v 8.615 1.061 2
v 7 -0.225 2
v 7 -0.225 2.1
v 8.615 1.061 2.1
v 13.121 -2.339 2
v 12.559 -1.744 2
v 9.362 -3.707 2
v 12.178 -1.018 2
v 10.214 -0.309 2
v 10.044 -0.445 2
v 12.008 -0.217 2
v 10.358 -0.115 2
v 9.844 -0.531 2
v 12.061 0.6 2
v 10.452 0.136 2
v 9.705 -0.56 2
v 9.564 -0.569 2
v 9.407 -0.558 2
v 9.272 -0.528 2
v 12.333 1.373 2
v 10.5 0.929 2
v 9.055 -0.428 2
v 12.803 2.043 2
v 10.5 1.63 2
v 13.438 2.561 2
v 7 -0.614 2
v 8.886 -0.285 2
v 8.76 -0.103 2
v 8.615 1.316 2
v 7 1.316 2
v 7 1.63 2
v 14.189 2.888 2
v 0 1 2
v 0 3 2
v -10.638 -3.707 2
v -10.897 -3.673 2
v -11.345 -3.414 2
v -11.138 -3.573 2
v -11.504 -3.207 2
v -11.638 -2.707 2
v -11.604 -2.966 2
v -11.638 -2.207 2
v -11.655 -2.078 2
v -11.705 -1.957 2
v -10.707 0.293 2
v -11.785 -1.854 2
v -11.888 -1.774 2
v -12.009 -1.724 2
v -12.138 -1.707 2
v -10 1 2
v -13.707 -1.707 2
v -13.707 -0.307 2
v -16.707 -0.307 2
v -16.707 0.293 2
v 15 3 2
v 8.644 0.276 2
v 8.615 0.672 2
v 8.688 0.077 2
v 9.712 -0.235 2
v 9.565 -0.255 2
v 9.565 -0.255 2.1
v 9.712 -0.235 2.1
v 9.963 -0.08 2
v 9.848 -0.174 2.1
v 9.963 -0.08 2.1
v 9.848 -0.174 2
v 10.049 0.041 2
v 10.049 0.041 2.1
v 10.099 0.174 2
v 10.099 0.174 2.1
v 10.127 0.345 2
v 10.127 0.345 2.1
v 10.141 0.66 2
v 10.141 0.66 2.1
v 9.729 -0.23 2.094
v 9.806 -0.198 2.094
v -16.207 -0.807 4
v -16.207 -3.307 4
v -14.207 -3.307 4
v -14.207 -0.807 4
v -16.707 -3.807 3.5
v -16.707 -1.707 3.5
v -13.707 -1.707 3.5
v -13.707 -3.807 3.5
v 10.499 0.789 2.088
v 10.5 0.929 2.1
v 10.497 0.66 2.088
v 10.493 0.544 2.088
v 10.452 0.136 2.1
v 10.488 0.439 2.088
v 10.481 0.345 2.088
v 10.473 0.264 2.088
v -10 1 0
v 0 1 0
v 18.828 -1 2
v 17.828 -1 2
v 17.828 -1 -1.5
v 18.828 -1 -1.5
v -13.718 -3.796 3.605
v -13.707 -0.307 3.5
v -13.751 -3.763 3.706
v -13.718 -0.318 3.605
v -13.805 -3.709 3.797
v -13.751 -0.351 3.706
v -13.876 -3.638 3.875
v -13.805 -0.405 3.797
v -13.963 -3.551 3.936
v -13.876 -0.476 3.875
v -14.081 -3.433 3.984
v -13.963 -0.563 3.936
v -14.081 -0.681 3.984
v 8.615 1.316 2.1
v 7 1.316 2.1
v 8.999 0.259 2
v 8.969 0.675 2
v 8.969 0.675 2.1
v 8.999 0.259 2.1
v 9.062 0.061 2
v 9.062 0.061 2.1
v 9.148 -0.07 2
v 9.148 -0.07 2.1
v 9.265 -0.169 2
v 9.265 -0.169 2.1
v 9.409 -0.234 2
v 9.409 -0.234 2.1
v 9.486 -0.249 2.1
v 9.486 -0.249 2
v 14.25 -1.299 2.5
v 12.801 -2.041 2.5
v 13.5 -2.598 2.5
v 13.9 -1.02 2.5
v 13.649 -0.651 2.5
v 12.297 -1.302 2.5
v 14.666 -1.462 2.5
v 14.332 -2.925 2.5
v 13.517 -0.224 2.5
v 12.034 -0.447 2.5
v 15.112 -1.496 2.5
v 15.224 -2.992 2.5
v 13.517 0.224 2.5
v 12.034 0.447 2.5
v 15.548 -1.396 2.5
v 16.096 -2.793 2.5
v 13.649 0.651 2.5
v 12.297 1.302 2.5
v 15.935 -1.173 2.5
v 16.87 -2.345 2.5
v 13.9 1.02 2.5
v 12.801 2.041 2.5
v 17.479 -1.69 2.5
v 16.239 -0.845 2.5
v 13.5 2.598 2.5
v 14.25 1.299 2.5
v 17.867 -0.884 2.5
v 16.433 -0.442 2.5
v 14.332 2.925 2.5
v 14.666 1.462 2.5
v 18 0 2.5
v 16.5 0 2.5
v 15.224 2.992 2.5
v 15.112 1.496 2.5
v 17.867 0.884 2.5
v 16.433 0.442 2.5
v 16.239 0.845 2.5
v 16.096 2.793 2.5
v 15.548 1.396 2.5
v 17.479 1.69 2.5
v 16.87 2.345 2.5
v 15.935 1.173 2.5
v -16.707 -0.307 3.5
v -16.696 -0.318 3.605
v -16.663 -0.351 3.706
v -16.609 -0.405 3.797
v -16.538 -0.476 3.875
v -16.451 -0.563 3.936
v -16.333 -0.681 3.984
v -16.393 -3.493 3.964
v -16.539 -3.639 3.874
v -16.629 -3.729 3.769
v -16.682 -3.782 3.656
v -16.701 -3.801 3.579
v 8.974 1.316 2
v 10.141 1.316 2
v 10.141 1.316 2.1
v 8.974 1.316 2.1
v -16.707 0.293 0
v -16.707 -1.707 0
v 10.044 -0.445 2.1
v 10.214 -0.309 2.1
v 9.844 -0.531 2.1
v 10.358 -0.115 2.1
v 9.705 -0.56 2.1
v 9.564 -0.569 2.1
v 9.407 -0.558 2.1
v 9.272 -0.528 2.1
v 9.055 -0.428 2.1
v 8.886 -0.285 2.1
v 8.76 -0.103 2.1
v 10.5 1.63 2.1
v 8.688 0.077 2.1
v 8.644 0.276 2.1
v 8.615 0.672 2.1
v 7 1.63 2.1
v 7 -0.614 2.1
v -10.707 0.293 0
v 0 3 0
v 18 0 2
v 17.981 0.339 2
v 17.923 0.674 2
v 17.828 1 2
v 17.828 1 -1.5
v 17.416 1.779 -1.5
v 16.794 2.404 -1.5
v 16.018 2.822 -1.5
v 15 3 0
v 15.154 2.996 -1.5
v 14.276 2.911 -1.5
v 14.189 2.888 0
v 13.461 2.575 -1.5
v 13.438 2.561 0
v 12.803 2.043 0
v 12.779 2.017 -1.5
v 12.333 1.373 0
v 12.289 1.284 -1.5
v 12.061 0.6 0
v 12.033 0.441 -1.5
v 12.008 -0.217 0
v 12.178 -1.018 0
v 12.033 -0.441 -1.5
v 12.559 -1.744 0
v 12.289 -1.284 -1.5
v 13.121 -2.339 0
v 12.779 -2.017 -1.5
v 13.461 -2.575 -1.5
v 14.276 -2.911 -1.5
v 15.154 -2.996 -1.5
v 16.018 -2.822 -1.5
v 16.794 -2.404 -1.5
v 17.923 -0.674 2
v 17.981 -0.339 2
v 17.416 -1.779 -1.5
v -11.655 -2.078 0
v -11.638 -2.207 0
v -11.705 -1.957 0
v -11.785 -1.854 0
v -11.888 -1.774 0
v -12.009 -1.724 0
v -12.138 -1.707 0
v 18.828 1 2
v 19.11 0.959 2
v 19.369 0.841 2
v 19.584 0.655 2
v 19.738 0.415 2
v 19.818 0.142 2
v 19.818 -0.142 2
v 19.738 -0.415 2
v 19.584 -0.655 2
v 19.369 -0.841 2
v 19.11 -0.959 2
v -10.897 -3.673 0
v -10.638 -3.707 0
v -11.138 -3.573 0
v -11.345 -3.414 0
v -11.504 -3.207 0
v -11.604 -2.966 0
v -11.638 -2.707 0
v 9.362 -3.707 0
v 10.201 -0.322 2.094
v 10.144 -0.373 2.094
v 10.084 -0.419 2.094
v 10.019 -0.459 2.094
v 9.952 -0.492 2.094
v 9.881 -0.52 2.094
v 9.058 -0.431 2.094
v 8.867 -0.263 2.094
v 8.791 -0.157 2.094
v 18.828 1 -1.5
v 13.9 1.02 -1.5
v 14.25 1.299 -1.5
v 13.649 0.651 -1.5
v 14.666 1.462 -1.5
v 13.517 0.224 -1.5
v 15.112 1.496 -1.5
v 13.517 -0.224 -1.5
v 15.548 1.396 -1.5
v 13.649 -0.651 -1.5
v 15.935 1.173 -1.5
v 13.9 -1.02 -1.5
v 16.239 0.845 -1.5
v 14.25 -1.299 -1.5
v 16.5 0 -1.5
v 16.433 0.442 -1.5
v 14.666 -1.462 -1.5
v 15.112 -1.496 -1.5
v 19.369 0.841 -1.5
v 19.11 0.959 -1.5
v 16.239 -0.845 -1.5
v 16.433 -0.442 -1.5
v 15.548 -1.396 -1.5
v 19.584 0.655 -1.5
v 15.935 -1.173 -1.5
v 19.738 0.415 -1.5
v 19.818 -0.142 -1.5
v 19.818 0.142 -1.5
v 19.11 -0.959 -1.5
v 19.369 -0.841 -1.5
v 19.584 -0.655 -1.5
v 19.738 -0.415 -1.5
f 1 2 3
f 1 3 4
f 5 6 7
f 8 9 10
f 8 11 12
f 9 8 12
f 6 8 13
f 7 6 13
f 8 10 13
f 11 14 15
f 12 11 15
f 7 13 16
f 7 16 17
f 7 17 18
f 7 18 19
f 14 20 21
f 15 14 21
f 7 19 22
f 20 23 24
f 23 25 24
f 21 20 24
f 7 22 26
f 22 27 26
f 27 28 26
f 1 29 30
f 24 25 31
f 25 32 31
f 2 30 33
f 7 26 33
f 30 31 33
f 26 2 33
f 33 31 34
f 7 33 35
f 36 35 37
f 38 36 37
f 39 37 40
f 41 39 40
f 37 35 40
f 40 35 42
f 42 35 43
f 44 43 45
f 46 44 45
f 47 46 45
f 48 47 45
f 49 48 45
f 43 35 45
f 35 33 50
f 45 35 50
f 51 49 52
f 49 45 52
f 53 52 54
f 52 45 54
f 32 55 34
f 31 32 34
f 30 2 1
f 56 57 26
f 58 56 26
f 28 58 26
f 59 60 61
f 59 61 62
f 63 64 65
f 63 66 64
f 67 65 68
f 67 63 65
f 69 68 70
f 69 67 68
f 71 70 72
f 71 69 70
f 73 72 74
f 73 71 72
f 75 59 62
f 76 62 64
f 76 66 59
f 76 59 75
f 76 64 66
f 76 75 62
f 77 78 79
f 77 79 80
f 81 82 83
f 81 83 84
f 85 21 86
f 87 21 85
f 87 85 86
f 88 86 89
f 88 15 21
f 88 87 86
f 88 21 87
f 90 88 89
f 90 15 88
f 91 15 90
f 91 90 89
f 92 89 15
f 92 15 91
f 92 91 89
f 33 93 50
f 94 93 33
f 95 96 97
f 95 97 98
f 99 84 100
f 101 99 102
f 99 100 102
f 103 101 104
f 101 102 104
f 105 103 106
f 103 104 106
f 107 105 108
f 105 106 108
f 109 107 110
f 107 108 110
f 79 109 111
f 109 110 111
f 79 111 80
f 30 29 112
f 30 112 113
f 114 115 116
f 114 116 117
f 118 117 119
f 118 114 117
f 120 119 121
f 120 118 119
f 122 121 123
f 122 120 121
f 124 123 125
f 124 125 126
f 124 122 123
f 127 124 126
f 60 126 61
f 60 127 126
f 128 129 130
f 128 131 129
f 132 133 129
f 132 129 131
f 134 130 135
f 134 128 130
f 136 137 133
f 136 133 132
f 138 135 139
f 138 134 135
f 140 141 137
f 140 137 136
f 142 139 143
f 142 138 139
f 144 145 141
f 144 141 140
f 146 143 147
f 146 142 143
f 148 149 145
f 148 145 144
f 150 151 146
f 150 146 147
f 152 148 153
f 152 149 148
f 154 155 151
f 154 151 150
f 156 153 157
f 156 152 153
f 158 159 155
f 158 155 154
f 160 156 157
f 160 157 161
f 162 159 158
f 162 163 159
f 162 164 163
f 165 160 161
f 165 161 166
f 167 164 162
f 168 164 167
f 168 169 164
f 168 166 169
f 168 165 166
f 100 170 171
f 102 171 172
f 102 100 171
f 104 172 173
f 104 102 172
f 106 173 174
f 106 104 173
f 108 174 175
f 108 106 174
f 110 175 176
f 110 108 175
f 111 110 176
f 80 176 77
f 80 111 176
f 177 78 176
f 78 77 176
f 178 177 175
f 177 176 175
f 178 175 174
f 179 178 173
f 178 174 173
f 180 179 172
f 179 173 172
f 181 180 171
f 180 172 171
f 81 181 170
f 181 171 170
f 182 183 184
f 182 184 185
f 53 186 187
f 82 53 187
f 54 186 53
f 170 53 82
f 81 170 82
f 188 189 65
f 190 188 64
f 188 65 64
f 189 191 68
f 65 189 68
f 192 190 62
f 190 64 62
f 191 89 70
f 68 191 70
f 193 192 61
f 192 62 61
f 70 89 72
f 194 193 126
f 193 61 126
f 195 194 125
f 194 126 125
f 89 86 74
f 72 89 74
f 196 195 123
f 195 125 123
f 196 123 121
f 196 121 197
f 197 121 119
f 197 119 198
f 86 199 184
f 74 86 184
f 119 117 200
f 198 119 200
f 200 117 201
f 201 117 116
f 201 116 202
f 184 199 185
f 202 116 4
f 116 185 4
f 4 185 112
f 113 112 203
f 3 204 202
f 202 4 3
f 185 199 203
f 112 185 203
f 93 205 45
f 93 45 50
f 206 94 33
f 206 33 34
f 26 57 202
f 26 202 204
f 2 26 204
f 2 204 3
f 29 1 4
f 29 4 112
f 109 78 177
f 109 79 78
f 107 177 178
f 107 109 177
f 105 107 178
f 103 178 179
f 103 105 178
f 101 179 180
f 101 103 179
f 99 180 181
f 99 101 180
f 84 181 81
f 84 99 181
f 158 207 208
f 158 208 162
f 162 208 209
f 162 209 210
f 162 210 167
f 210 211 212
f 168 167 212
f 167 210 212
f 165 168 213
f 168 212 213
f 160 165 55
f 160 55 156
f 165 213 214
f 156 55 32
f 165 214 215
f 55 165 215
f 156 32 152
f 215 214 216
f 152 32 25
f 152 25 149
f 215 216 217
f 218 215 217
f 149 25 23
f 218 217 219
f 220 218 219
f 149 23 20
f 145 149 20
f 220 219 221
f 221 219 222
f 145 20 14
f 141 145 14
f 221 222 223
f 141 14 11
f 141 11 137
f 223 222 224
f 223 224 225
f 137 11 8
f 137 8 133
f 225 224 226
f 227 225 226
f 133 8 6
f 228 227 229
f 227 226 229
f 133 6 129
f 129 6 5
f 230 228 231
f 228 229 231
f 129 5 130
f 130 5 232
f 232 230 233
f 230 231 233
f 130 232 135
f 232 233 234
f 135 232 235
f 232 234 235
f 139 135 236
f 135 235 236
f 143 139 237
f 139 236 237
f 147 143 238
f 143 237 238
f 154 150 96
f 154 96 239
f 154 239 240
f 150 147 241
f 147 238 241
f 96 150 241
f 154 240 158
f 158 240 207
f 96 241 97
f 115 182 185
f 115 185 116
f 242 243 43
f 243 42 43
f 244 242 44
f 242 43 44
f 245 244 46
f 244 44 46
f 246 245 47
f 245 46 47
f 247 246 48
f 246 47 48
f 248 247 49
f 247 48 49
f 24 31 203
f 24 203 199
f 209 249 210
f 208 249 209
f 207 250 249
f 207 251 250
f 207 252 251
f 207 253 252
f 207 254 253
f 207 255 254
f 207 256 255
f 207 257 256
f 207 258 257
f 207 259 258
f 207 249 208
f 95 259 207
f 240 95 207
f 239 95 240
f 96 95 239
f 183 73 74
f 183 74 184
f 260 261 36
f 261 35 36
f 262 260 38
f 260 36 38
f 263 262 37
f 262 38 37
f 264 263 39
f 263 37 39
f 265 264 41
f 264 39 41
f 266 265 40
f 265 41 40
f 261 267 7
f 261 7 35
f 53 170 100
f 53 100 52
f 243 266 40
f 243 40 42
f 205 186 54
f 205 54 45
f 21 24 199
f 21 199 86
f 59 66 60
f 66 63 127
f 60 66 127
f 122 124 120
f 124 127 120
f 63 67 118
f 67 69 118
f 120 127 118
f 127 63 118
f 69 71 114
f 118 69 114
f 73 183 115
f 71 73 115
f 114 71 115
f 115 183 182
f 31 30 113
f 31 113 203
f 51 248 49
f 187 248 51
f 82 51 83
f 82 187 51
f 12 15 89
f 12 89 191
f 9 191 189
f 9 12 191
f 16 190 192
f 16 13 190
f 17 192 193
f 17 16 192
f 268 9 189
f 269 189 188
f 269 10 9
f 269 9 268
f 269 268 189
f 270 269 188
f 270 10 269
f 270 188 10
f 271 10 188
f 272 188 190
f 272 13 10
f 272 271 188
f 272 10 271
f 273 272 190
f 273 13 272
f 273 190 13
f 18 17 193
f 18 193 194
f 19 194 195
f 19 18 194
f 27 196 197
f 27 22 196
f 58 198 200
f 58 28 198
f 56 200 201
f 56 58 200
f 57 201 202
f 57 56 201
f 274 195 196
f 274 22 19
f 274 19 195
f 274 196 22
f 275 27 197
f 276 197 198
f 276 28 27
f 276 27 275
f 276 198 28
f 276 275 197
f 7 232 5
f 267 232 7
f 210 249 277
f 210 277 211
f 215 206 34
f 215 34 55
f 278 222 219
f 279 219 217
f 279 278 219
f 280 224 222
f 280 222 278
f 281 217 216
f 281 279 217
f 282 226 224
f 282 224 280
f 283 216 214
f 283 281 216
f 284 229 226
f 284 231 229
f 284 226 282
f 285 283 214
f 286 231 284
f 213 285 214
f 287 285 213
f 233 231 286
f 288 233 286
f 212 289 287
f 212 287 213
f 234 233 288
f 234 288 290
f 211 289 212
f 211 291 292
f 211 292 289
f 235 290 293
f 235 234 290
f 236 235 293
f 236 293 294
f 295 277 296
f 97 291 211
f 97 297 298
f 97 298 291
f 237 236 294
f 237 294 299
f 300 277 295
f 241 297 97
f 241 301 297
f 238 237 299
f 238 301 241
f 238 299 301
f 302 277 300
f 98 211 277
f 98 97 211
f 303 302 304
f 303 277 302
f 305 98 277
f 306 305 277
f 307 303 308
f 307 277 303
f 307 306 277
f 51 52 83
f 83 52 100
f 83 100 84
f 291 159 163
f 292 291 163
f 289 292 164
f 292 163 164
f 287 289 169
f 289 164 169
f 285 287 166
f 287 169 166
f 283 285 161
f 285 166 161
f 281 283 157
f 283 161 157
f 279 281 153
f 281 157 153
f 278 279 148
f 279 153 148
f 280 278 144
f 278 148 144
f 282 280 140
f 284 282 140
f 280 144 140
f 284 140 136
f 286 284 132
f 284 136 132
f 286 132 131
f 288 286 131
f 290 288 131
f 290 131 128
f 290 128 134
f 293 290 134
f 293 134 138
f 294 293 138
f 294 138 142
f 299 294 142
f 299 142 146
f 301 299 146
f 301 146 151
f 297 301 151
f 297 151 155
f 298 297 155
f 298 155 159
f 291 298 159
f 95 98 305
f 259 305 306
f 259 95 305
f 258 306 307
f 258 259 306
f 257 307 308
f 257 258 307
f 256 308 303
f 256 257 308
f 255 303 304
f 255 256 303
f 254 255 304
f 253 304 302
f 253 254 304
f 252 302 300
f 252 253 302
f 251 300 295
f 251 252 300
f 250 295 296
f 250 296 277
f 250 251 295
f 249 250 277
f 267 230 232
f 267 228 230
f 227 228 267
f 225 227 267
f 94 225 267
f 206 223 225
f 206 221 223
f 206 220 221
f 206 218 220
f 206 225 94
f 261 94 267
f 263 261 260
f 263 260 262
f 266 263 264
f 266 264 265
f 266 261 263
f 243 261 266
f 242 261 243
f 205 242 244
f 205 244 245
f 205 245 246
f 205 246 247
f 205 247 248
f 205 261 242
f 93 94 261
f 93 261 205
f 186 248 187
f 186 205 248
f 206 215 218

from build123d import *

# Parameters (mm, degrees)
ESTRUSIONE_ESTRUSIONE1_DEPTH             = 2
RACCORDO1_R                              = 1
RACCORDO2_R                              = 0.5
ESTRUSIONE_ESTRUSIONE2_DEPTH             = 2.5
ESTRUSIONE_ESTRUSIONE2_DEPTH_BACK        = 1.5
SCHIZZO2_R                               = 3
ESTRUSIONE_ESTRUSIONE3_REACH             = 20.547
ESTRUSIONE_ESTRUSIONE3_DIRECTION_2_REACH = 20.547
ESTRUSIONE_ESTRUSIONE4_DEPTH             = 3
RACCORDO3_R                              = 0.5
SCHIZZO5_R                               = 1.5
TAGLIO_ESTRUSIONE1_DEPTH                 = 21.58301689
ESTRUSIONE_ESTRUSIONE5_DEPTH             = 0.1


with BuildPart() as part:
    # Schizzo1 → Estrusione-Estrusione1 (new body)
    with BuildSketch(Plane.XY):
        Polygon((-16.707106781, 0.292893219), (-10.707106781, 0.292893219), (-10, 1), (0, 1), (0, 3), (15, 3), (15, 0), (15, -1.654985921), (9.361844275, -3.707106781), (-11.638155725, -3.707106781), (-11.638155725, -1.707106781), (-16.707106781, -1.707106781), align=None)
    extrude(amount=ESTRUSIONE_ESTRUSIONE1_DEPTH)

    # Raccordo1
    raccordo1_edges = [part.edges().sort_by_distance(p)[0] for p in [
        (-11.638155725, -3.707106781, 1),
    ]]
    fillet(raccordo1_edges, radius=RACCORDO1_R)

    # Raccordo2
    raccordo2_edges = [part.edges().sort_by_distance(p)[0] for p in [
        (-11.638155725, -1.707106781, 1),
    ]]
    fillet(raccordo2_edges, radius=RACCORDO2_R)

    # Schizzo2 → Estrusione-Estrusione2 (add, two sides: drawn at the far end of the back side and taken through both)
    with BuildSketch(Plane.XY.offset(-ESTRUSIONE_ESTRUSIONE2_DEPTH_BACK)):
        with Locations((15, 0)):
            Circle(SCHIZZO2_R)
    extrude(amount=ESTRUSIONE_ESTRUSIONE2_DEPTH + ESTRUSIONE_ESTRUSIONE2_DEPTH_BACK)

    # Estrusione-Estrusione3: up to this face of the body (flat: up to its plane)
    estrusione_estrusione3_end = Plane(part.part.faces().sort_by_distance((0.378494116, -0.704899382, 2))[0])
    # Schizzo3 → Estrusione-Estrusione3 (add, up to the picked face)
    with BuildSketch(Plane.XY, mode=Mode.PRIVATE) as estrusione_estrusione3_sk1:
        with BuildLine():
            Line((18.828427125, 1), (17.828427125, 1))
            ThreePointArc((17.828427125, 1), (18, 0), (17.828427125, -1))
            Line((17.828427125, -1), (18.828427125, -1))
            ThreePointArc((18.828427125, -1), (19.828427125, 0), (18.828427125, 1))
        make_face()
    estrusione_estrusione3_tool1 = split(extrude(estrusione_estrusione3_sk1.sketch, amount=ESTRUSIONE_ESTRUSIONE3_REACH, mode=Mode.PRIVATE), bisect_by=estrusione_estrusione3_end, keep=Keep.BOTH, mode=Mode.PRIVATE)
    add(estrusione_estrusione3_tool1.solids().sort_by(Axis((18.792788, 0, 0), (0, 0, 1)))[0])

    # Estrusione-Estrusione3 direction 2: up to this face of the body (flat: up to its plane)
    estrusione_estrusione3_direction_2_end = Plane(part.part.faces().sort_by_distance((15, 0, -1.5))[0])
    # Schizzo3 → Estrusione-Estrusione3 direction 2 (add, up to the picked face)
    with BuildSketch(Plane.XY, mode=Mode.PRIVATE) as estrusione_estrusione3_direction_2_sk1:
        with BuildLine():
            Line((18.828427125, 1), (17.828427125, 1))
            ThreePointArc((17.828427125, 1), (18, 0), (17.828427125, -1))
            Line((17.828427125, -1), (18.828427125, -1))
            ThreePointArc((18.828427125, -1), (19.828427125, 0), (18.828427125, 1))
        make_face()
    estrusione_estrusione3_direction_2_tool1 = split(extrude(estrusione_estrusione3_direction_2_sk1.sketch, amount=-ESTRUSIONE_ESTRUSIONE3_DIRECTION_2_REACH, mode=Mode.PRIVATE), bisect_by=estrusione_estrusione3_direction_2_end, keep=Keep.BOTH, mode=Mode.PRIVATE)
    add(estrusione_estrusione3_direction_2_tool1.solids().sort_by(Axis((18.792788, 0, 0), (0, 0, -1)))[0])

    # Schizzo4 → Estrusione-Estrusione4 (add)
    with BuildSketch(Plane.ZY.offset(16.707106781)):
        Polygon((2, -1.707106781), (3.5, -1.707106781), (3.5, -3.807106781), (4, -3.807106781), (4, -0.307106781), (2, -0.307106781), align=None)
    extrude(amount=-ESTRUSIONE_ESTRUSIONE4_DEPTH)

    # Raccordo3
    raccordo3_edges = [part.edges().sort_by_distance(p)[0] for p in [
        (-15.207106781, -0.307106781, 4),
        (-13.707106781, -2.057106781, 4),
        (-15.207106781, -3.807106781, 4),
        (-16.707106781, -2.057106781, 4),
    ]]
    fillet(raccordo3_edges, radius=RACCORDO3_R - 0.0001)  # a hair under: the kernel refuses the full size

    # Schizzo5 → Taglio-Estrusione1 (cut, through all)
    with BuildSketch(Plane.XY.offset(2.5)):
        with Locations((15, 0)):
            Circle(SCHIZZO5_R)
    extrude(amount=-TAGLIO_ESTRUSIONE1_DEPTH, mode=Mode.SUBTRACT)

    # Schizzo6 → Estrusione-Estrusione5 (add)
    with BuildSketch(Plane.XY.offset(2)):
        with BuildLine():
            Line((10.5, 1.629867893), (10.5, 0.92944722))
            add(Edge.make_bspline(
                [(10.5, 0.92944722), (10.499844414, 0.882706092), (10.499545672, 0.792957947), (10.497879909, 0.664384677), (10.493105553, 0.54755758), (10.48899697, 0.442537741), (10.481505028, 0.349327086), (10.474344381, 0.267639795), (10.46497072, 0.197852097), (10.456265297, 0.155606246), (10.452323718, 0.13647847)],
                knots=[0, 0, 0, 0, 1.410062039, 2.707475311, 3.878576406, 4.937260626, 5.877586885, 6.699081471, 7.410979367, 8, 8, 8, 8], degree=3))
            add(Edge.make_bspline(
                [(10.452323718, 0.13647847), (10.44599767, 0.110871395), (10.433480527, 0.060203513), (10.407010513, -0.012740009), (10.376429305, -0.082278475), (10.340231746, -0.148150926), (10.299049203, -0.210363472), (10.252641058, -0.268822966), (10.200770974, -0.323195178), (10.144763494, -0.373898474), (10.084129937, -0.419859381), (10.019753567, -0.459632532), (9.952037023, -0.493690082), (9.88074449, -0.520879248), (9.80647863, -0.542752098), (9.72859096, -0.55817975), (9.647429673, -0.567430547), (9.592071808, -0.568372457), (9.564002404, -0.568850055)],
                knots=[0, 0, 0, 0, 1.02737288, 2.032829108, 3.019628684, 3.985738875, 4.958353778, 5.924249254, 6.890702889, 7.883913451, 8.865824512, 9.85161466, 10.829249435, 11.81541824, 12.821369441, 13.843154991, 14.906364023, 16, 16, 16, 16], degree=3))
            add(Edge.make_bspline(
                [(9.564002404, -0.568850055), (9.517367246, -0.567381095), (9.426369973, -0.564514774), (9.294309841, -0.537789138), (9.171117785, -0.494014565), (9.056965246, -0.433684102), (8.954017226, -0.356891178), (8.863900454, -0.264603546), (8.787792734, -0.157292512), (8.735576131, -0.056923958), (8.70197773, 0.031778426), (8.678219098, 0.105018096), (8.660172121, 0.18497086), (8.643769941, 0.270489675), (8.631253759, 0.362235095), (8.622364892, 0.460022369), (8.616649282, 0.564096068), (8.615814207, 0.635435829), (8.615384615, 0.672135521)],
                knots=[0, 0, 0, 0, 1.260402266, 2.459371274, 3.627181936, 4.786749125, 5.93865593, 7.087644312, 8.261344208, 9.485713728, 10.136162886, 10.825977872, 11.566646758, 12.35154167, 13.181268117, 14.0701832, 15.007234106, 16, 16, 16, 16], degree=3))
            Line((8.615384615, 0.672135521), (7, -0.61372185))
            Line((7, -0.61372185), (7, -0.225300376))
            Line((7, -0.225300376), (8.615384615, 1.060556996))
            Line((8.615384615, 1.060556996), (8.615384615, 1.315765329))
            Line((8.615384615, 1.315765329), (7, 1.315765329))
            Line((7, 1.315765329), (7, 1.629867893))
            Line((7, 1.629867893), (10.5, 1.629867893))
        make_face()
        with BuildLine():
            Line((10.141025641, 1.315765329), (8.974358974, 1.315765329))
            Line((8.974358974, 1.315765329), (8.969451122, 0.674940009))
            add(Edge.make_bspline(
                [(8.969451122, 0.674940009), (8.969437885, 0.64501997), (8.969412229, 0.587026413), (8.973406004, 0.503125746), (8.977949327, 0.425005641), (8.984898657, 0.352964869), (8.993854777, 0.286971357), (9.005057604, 0.227057739), (9.01811018, 0.173127354), (9.038309643, 0.110226003), (9.070330282, 0.040008487), (9.116838436, -0.036397556), (9.175714061, -0.101242729), (9.241967426, -0.157151837), (9.316309813, -0.200216089), (9.395441443, -0.23155931), (9.478679147, -0.251228927), (9.53585099, -0.253567367), (9.564703526, -0.254747491)],
                knots=[0, 0, 0, 0, 1.14660753, 2.222451964, 3.218720504, 4.145691244, 4.995719623, 5.770487122, 6.480909919, 7.121111896, 8.299844659, 9.430703709, 10.534634535, 11.641396424, 12.741395289, 13.810956493, 14.895269934, 16, 16, 16, 16], degree=3))
            add(Edge.make_bspline(
                [(9.564703526, -0.254747491), (9.592857905, -0.253563739), (9.648649611, -0.251217974), (9.730103047, -0.231521199), (9.807529909, -0.199713788), (9.879454388, -0.155112436), (9.94528638, -0.101218543), (10.000835297, -0.037211531), (10.047354277, 0.033685128), (10.076864421, 0.09999535), (10.094992971, 0.159223507), (10.107734135, 0.210655613), (10.118056983, 0.268990383), (10.126082803, 0.334088015), (10.133305124, 0.405830736), (10.137987885, 0.484414991), (10.140818147, 0.569750034), (10.140954867, 0.628897216), (10.141025641, 0.659515329)],
                knots=[0, 0, 0, 0, 1.100801541, 2.181386982, 3.260112282, 4.364594493, 5.481957178, 6.577424609, 7.668452592, 8.790448866, 9.403819393, 10.091598921, 10.863153553, 11.720938239, 12.658472417, 13.685008818, 14.801622349, 16, 16, 16, 16], degree=3))
            Line((10.141025641, 0.659515329), (10.141025641, 1.315765329))
        make_face(mode=Mode.SUBTRACT)
    extrude(amount=ESTRUSIONE_ESTRUSIONE5_DEPTH)


solid = part.part
